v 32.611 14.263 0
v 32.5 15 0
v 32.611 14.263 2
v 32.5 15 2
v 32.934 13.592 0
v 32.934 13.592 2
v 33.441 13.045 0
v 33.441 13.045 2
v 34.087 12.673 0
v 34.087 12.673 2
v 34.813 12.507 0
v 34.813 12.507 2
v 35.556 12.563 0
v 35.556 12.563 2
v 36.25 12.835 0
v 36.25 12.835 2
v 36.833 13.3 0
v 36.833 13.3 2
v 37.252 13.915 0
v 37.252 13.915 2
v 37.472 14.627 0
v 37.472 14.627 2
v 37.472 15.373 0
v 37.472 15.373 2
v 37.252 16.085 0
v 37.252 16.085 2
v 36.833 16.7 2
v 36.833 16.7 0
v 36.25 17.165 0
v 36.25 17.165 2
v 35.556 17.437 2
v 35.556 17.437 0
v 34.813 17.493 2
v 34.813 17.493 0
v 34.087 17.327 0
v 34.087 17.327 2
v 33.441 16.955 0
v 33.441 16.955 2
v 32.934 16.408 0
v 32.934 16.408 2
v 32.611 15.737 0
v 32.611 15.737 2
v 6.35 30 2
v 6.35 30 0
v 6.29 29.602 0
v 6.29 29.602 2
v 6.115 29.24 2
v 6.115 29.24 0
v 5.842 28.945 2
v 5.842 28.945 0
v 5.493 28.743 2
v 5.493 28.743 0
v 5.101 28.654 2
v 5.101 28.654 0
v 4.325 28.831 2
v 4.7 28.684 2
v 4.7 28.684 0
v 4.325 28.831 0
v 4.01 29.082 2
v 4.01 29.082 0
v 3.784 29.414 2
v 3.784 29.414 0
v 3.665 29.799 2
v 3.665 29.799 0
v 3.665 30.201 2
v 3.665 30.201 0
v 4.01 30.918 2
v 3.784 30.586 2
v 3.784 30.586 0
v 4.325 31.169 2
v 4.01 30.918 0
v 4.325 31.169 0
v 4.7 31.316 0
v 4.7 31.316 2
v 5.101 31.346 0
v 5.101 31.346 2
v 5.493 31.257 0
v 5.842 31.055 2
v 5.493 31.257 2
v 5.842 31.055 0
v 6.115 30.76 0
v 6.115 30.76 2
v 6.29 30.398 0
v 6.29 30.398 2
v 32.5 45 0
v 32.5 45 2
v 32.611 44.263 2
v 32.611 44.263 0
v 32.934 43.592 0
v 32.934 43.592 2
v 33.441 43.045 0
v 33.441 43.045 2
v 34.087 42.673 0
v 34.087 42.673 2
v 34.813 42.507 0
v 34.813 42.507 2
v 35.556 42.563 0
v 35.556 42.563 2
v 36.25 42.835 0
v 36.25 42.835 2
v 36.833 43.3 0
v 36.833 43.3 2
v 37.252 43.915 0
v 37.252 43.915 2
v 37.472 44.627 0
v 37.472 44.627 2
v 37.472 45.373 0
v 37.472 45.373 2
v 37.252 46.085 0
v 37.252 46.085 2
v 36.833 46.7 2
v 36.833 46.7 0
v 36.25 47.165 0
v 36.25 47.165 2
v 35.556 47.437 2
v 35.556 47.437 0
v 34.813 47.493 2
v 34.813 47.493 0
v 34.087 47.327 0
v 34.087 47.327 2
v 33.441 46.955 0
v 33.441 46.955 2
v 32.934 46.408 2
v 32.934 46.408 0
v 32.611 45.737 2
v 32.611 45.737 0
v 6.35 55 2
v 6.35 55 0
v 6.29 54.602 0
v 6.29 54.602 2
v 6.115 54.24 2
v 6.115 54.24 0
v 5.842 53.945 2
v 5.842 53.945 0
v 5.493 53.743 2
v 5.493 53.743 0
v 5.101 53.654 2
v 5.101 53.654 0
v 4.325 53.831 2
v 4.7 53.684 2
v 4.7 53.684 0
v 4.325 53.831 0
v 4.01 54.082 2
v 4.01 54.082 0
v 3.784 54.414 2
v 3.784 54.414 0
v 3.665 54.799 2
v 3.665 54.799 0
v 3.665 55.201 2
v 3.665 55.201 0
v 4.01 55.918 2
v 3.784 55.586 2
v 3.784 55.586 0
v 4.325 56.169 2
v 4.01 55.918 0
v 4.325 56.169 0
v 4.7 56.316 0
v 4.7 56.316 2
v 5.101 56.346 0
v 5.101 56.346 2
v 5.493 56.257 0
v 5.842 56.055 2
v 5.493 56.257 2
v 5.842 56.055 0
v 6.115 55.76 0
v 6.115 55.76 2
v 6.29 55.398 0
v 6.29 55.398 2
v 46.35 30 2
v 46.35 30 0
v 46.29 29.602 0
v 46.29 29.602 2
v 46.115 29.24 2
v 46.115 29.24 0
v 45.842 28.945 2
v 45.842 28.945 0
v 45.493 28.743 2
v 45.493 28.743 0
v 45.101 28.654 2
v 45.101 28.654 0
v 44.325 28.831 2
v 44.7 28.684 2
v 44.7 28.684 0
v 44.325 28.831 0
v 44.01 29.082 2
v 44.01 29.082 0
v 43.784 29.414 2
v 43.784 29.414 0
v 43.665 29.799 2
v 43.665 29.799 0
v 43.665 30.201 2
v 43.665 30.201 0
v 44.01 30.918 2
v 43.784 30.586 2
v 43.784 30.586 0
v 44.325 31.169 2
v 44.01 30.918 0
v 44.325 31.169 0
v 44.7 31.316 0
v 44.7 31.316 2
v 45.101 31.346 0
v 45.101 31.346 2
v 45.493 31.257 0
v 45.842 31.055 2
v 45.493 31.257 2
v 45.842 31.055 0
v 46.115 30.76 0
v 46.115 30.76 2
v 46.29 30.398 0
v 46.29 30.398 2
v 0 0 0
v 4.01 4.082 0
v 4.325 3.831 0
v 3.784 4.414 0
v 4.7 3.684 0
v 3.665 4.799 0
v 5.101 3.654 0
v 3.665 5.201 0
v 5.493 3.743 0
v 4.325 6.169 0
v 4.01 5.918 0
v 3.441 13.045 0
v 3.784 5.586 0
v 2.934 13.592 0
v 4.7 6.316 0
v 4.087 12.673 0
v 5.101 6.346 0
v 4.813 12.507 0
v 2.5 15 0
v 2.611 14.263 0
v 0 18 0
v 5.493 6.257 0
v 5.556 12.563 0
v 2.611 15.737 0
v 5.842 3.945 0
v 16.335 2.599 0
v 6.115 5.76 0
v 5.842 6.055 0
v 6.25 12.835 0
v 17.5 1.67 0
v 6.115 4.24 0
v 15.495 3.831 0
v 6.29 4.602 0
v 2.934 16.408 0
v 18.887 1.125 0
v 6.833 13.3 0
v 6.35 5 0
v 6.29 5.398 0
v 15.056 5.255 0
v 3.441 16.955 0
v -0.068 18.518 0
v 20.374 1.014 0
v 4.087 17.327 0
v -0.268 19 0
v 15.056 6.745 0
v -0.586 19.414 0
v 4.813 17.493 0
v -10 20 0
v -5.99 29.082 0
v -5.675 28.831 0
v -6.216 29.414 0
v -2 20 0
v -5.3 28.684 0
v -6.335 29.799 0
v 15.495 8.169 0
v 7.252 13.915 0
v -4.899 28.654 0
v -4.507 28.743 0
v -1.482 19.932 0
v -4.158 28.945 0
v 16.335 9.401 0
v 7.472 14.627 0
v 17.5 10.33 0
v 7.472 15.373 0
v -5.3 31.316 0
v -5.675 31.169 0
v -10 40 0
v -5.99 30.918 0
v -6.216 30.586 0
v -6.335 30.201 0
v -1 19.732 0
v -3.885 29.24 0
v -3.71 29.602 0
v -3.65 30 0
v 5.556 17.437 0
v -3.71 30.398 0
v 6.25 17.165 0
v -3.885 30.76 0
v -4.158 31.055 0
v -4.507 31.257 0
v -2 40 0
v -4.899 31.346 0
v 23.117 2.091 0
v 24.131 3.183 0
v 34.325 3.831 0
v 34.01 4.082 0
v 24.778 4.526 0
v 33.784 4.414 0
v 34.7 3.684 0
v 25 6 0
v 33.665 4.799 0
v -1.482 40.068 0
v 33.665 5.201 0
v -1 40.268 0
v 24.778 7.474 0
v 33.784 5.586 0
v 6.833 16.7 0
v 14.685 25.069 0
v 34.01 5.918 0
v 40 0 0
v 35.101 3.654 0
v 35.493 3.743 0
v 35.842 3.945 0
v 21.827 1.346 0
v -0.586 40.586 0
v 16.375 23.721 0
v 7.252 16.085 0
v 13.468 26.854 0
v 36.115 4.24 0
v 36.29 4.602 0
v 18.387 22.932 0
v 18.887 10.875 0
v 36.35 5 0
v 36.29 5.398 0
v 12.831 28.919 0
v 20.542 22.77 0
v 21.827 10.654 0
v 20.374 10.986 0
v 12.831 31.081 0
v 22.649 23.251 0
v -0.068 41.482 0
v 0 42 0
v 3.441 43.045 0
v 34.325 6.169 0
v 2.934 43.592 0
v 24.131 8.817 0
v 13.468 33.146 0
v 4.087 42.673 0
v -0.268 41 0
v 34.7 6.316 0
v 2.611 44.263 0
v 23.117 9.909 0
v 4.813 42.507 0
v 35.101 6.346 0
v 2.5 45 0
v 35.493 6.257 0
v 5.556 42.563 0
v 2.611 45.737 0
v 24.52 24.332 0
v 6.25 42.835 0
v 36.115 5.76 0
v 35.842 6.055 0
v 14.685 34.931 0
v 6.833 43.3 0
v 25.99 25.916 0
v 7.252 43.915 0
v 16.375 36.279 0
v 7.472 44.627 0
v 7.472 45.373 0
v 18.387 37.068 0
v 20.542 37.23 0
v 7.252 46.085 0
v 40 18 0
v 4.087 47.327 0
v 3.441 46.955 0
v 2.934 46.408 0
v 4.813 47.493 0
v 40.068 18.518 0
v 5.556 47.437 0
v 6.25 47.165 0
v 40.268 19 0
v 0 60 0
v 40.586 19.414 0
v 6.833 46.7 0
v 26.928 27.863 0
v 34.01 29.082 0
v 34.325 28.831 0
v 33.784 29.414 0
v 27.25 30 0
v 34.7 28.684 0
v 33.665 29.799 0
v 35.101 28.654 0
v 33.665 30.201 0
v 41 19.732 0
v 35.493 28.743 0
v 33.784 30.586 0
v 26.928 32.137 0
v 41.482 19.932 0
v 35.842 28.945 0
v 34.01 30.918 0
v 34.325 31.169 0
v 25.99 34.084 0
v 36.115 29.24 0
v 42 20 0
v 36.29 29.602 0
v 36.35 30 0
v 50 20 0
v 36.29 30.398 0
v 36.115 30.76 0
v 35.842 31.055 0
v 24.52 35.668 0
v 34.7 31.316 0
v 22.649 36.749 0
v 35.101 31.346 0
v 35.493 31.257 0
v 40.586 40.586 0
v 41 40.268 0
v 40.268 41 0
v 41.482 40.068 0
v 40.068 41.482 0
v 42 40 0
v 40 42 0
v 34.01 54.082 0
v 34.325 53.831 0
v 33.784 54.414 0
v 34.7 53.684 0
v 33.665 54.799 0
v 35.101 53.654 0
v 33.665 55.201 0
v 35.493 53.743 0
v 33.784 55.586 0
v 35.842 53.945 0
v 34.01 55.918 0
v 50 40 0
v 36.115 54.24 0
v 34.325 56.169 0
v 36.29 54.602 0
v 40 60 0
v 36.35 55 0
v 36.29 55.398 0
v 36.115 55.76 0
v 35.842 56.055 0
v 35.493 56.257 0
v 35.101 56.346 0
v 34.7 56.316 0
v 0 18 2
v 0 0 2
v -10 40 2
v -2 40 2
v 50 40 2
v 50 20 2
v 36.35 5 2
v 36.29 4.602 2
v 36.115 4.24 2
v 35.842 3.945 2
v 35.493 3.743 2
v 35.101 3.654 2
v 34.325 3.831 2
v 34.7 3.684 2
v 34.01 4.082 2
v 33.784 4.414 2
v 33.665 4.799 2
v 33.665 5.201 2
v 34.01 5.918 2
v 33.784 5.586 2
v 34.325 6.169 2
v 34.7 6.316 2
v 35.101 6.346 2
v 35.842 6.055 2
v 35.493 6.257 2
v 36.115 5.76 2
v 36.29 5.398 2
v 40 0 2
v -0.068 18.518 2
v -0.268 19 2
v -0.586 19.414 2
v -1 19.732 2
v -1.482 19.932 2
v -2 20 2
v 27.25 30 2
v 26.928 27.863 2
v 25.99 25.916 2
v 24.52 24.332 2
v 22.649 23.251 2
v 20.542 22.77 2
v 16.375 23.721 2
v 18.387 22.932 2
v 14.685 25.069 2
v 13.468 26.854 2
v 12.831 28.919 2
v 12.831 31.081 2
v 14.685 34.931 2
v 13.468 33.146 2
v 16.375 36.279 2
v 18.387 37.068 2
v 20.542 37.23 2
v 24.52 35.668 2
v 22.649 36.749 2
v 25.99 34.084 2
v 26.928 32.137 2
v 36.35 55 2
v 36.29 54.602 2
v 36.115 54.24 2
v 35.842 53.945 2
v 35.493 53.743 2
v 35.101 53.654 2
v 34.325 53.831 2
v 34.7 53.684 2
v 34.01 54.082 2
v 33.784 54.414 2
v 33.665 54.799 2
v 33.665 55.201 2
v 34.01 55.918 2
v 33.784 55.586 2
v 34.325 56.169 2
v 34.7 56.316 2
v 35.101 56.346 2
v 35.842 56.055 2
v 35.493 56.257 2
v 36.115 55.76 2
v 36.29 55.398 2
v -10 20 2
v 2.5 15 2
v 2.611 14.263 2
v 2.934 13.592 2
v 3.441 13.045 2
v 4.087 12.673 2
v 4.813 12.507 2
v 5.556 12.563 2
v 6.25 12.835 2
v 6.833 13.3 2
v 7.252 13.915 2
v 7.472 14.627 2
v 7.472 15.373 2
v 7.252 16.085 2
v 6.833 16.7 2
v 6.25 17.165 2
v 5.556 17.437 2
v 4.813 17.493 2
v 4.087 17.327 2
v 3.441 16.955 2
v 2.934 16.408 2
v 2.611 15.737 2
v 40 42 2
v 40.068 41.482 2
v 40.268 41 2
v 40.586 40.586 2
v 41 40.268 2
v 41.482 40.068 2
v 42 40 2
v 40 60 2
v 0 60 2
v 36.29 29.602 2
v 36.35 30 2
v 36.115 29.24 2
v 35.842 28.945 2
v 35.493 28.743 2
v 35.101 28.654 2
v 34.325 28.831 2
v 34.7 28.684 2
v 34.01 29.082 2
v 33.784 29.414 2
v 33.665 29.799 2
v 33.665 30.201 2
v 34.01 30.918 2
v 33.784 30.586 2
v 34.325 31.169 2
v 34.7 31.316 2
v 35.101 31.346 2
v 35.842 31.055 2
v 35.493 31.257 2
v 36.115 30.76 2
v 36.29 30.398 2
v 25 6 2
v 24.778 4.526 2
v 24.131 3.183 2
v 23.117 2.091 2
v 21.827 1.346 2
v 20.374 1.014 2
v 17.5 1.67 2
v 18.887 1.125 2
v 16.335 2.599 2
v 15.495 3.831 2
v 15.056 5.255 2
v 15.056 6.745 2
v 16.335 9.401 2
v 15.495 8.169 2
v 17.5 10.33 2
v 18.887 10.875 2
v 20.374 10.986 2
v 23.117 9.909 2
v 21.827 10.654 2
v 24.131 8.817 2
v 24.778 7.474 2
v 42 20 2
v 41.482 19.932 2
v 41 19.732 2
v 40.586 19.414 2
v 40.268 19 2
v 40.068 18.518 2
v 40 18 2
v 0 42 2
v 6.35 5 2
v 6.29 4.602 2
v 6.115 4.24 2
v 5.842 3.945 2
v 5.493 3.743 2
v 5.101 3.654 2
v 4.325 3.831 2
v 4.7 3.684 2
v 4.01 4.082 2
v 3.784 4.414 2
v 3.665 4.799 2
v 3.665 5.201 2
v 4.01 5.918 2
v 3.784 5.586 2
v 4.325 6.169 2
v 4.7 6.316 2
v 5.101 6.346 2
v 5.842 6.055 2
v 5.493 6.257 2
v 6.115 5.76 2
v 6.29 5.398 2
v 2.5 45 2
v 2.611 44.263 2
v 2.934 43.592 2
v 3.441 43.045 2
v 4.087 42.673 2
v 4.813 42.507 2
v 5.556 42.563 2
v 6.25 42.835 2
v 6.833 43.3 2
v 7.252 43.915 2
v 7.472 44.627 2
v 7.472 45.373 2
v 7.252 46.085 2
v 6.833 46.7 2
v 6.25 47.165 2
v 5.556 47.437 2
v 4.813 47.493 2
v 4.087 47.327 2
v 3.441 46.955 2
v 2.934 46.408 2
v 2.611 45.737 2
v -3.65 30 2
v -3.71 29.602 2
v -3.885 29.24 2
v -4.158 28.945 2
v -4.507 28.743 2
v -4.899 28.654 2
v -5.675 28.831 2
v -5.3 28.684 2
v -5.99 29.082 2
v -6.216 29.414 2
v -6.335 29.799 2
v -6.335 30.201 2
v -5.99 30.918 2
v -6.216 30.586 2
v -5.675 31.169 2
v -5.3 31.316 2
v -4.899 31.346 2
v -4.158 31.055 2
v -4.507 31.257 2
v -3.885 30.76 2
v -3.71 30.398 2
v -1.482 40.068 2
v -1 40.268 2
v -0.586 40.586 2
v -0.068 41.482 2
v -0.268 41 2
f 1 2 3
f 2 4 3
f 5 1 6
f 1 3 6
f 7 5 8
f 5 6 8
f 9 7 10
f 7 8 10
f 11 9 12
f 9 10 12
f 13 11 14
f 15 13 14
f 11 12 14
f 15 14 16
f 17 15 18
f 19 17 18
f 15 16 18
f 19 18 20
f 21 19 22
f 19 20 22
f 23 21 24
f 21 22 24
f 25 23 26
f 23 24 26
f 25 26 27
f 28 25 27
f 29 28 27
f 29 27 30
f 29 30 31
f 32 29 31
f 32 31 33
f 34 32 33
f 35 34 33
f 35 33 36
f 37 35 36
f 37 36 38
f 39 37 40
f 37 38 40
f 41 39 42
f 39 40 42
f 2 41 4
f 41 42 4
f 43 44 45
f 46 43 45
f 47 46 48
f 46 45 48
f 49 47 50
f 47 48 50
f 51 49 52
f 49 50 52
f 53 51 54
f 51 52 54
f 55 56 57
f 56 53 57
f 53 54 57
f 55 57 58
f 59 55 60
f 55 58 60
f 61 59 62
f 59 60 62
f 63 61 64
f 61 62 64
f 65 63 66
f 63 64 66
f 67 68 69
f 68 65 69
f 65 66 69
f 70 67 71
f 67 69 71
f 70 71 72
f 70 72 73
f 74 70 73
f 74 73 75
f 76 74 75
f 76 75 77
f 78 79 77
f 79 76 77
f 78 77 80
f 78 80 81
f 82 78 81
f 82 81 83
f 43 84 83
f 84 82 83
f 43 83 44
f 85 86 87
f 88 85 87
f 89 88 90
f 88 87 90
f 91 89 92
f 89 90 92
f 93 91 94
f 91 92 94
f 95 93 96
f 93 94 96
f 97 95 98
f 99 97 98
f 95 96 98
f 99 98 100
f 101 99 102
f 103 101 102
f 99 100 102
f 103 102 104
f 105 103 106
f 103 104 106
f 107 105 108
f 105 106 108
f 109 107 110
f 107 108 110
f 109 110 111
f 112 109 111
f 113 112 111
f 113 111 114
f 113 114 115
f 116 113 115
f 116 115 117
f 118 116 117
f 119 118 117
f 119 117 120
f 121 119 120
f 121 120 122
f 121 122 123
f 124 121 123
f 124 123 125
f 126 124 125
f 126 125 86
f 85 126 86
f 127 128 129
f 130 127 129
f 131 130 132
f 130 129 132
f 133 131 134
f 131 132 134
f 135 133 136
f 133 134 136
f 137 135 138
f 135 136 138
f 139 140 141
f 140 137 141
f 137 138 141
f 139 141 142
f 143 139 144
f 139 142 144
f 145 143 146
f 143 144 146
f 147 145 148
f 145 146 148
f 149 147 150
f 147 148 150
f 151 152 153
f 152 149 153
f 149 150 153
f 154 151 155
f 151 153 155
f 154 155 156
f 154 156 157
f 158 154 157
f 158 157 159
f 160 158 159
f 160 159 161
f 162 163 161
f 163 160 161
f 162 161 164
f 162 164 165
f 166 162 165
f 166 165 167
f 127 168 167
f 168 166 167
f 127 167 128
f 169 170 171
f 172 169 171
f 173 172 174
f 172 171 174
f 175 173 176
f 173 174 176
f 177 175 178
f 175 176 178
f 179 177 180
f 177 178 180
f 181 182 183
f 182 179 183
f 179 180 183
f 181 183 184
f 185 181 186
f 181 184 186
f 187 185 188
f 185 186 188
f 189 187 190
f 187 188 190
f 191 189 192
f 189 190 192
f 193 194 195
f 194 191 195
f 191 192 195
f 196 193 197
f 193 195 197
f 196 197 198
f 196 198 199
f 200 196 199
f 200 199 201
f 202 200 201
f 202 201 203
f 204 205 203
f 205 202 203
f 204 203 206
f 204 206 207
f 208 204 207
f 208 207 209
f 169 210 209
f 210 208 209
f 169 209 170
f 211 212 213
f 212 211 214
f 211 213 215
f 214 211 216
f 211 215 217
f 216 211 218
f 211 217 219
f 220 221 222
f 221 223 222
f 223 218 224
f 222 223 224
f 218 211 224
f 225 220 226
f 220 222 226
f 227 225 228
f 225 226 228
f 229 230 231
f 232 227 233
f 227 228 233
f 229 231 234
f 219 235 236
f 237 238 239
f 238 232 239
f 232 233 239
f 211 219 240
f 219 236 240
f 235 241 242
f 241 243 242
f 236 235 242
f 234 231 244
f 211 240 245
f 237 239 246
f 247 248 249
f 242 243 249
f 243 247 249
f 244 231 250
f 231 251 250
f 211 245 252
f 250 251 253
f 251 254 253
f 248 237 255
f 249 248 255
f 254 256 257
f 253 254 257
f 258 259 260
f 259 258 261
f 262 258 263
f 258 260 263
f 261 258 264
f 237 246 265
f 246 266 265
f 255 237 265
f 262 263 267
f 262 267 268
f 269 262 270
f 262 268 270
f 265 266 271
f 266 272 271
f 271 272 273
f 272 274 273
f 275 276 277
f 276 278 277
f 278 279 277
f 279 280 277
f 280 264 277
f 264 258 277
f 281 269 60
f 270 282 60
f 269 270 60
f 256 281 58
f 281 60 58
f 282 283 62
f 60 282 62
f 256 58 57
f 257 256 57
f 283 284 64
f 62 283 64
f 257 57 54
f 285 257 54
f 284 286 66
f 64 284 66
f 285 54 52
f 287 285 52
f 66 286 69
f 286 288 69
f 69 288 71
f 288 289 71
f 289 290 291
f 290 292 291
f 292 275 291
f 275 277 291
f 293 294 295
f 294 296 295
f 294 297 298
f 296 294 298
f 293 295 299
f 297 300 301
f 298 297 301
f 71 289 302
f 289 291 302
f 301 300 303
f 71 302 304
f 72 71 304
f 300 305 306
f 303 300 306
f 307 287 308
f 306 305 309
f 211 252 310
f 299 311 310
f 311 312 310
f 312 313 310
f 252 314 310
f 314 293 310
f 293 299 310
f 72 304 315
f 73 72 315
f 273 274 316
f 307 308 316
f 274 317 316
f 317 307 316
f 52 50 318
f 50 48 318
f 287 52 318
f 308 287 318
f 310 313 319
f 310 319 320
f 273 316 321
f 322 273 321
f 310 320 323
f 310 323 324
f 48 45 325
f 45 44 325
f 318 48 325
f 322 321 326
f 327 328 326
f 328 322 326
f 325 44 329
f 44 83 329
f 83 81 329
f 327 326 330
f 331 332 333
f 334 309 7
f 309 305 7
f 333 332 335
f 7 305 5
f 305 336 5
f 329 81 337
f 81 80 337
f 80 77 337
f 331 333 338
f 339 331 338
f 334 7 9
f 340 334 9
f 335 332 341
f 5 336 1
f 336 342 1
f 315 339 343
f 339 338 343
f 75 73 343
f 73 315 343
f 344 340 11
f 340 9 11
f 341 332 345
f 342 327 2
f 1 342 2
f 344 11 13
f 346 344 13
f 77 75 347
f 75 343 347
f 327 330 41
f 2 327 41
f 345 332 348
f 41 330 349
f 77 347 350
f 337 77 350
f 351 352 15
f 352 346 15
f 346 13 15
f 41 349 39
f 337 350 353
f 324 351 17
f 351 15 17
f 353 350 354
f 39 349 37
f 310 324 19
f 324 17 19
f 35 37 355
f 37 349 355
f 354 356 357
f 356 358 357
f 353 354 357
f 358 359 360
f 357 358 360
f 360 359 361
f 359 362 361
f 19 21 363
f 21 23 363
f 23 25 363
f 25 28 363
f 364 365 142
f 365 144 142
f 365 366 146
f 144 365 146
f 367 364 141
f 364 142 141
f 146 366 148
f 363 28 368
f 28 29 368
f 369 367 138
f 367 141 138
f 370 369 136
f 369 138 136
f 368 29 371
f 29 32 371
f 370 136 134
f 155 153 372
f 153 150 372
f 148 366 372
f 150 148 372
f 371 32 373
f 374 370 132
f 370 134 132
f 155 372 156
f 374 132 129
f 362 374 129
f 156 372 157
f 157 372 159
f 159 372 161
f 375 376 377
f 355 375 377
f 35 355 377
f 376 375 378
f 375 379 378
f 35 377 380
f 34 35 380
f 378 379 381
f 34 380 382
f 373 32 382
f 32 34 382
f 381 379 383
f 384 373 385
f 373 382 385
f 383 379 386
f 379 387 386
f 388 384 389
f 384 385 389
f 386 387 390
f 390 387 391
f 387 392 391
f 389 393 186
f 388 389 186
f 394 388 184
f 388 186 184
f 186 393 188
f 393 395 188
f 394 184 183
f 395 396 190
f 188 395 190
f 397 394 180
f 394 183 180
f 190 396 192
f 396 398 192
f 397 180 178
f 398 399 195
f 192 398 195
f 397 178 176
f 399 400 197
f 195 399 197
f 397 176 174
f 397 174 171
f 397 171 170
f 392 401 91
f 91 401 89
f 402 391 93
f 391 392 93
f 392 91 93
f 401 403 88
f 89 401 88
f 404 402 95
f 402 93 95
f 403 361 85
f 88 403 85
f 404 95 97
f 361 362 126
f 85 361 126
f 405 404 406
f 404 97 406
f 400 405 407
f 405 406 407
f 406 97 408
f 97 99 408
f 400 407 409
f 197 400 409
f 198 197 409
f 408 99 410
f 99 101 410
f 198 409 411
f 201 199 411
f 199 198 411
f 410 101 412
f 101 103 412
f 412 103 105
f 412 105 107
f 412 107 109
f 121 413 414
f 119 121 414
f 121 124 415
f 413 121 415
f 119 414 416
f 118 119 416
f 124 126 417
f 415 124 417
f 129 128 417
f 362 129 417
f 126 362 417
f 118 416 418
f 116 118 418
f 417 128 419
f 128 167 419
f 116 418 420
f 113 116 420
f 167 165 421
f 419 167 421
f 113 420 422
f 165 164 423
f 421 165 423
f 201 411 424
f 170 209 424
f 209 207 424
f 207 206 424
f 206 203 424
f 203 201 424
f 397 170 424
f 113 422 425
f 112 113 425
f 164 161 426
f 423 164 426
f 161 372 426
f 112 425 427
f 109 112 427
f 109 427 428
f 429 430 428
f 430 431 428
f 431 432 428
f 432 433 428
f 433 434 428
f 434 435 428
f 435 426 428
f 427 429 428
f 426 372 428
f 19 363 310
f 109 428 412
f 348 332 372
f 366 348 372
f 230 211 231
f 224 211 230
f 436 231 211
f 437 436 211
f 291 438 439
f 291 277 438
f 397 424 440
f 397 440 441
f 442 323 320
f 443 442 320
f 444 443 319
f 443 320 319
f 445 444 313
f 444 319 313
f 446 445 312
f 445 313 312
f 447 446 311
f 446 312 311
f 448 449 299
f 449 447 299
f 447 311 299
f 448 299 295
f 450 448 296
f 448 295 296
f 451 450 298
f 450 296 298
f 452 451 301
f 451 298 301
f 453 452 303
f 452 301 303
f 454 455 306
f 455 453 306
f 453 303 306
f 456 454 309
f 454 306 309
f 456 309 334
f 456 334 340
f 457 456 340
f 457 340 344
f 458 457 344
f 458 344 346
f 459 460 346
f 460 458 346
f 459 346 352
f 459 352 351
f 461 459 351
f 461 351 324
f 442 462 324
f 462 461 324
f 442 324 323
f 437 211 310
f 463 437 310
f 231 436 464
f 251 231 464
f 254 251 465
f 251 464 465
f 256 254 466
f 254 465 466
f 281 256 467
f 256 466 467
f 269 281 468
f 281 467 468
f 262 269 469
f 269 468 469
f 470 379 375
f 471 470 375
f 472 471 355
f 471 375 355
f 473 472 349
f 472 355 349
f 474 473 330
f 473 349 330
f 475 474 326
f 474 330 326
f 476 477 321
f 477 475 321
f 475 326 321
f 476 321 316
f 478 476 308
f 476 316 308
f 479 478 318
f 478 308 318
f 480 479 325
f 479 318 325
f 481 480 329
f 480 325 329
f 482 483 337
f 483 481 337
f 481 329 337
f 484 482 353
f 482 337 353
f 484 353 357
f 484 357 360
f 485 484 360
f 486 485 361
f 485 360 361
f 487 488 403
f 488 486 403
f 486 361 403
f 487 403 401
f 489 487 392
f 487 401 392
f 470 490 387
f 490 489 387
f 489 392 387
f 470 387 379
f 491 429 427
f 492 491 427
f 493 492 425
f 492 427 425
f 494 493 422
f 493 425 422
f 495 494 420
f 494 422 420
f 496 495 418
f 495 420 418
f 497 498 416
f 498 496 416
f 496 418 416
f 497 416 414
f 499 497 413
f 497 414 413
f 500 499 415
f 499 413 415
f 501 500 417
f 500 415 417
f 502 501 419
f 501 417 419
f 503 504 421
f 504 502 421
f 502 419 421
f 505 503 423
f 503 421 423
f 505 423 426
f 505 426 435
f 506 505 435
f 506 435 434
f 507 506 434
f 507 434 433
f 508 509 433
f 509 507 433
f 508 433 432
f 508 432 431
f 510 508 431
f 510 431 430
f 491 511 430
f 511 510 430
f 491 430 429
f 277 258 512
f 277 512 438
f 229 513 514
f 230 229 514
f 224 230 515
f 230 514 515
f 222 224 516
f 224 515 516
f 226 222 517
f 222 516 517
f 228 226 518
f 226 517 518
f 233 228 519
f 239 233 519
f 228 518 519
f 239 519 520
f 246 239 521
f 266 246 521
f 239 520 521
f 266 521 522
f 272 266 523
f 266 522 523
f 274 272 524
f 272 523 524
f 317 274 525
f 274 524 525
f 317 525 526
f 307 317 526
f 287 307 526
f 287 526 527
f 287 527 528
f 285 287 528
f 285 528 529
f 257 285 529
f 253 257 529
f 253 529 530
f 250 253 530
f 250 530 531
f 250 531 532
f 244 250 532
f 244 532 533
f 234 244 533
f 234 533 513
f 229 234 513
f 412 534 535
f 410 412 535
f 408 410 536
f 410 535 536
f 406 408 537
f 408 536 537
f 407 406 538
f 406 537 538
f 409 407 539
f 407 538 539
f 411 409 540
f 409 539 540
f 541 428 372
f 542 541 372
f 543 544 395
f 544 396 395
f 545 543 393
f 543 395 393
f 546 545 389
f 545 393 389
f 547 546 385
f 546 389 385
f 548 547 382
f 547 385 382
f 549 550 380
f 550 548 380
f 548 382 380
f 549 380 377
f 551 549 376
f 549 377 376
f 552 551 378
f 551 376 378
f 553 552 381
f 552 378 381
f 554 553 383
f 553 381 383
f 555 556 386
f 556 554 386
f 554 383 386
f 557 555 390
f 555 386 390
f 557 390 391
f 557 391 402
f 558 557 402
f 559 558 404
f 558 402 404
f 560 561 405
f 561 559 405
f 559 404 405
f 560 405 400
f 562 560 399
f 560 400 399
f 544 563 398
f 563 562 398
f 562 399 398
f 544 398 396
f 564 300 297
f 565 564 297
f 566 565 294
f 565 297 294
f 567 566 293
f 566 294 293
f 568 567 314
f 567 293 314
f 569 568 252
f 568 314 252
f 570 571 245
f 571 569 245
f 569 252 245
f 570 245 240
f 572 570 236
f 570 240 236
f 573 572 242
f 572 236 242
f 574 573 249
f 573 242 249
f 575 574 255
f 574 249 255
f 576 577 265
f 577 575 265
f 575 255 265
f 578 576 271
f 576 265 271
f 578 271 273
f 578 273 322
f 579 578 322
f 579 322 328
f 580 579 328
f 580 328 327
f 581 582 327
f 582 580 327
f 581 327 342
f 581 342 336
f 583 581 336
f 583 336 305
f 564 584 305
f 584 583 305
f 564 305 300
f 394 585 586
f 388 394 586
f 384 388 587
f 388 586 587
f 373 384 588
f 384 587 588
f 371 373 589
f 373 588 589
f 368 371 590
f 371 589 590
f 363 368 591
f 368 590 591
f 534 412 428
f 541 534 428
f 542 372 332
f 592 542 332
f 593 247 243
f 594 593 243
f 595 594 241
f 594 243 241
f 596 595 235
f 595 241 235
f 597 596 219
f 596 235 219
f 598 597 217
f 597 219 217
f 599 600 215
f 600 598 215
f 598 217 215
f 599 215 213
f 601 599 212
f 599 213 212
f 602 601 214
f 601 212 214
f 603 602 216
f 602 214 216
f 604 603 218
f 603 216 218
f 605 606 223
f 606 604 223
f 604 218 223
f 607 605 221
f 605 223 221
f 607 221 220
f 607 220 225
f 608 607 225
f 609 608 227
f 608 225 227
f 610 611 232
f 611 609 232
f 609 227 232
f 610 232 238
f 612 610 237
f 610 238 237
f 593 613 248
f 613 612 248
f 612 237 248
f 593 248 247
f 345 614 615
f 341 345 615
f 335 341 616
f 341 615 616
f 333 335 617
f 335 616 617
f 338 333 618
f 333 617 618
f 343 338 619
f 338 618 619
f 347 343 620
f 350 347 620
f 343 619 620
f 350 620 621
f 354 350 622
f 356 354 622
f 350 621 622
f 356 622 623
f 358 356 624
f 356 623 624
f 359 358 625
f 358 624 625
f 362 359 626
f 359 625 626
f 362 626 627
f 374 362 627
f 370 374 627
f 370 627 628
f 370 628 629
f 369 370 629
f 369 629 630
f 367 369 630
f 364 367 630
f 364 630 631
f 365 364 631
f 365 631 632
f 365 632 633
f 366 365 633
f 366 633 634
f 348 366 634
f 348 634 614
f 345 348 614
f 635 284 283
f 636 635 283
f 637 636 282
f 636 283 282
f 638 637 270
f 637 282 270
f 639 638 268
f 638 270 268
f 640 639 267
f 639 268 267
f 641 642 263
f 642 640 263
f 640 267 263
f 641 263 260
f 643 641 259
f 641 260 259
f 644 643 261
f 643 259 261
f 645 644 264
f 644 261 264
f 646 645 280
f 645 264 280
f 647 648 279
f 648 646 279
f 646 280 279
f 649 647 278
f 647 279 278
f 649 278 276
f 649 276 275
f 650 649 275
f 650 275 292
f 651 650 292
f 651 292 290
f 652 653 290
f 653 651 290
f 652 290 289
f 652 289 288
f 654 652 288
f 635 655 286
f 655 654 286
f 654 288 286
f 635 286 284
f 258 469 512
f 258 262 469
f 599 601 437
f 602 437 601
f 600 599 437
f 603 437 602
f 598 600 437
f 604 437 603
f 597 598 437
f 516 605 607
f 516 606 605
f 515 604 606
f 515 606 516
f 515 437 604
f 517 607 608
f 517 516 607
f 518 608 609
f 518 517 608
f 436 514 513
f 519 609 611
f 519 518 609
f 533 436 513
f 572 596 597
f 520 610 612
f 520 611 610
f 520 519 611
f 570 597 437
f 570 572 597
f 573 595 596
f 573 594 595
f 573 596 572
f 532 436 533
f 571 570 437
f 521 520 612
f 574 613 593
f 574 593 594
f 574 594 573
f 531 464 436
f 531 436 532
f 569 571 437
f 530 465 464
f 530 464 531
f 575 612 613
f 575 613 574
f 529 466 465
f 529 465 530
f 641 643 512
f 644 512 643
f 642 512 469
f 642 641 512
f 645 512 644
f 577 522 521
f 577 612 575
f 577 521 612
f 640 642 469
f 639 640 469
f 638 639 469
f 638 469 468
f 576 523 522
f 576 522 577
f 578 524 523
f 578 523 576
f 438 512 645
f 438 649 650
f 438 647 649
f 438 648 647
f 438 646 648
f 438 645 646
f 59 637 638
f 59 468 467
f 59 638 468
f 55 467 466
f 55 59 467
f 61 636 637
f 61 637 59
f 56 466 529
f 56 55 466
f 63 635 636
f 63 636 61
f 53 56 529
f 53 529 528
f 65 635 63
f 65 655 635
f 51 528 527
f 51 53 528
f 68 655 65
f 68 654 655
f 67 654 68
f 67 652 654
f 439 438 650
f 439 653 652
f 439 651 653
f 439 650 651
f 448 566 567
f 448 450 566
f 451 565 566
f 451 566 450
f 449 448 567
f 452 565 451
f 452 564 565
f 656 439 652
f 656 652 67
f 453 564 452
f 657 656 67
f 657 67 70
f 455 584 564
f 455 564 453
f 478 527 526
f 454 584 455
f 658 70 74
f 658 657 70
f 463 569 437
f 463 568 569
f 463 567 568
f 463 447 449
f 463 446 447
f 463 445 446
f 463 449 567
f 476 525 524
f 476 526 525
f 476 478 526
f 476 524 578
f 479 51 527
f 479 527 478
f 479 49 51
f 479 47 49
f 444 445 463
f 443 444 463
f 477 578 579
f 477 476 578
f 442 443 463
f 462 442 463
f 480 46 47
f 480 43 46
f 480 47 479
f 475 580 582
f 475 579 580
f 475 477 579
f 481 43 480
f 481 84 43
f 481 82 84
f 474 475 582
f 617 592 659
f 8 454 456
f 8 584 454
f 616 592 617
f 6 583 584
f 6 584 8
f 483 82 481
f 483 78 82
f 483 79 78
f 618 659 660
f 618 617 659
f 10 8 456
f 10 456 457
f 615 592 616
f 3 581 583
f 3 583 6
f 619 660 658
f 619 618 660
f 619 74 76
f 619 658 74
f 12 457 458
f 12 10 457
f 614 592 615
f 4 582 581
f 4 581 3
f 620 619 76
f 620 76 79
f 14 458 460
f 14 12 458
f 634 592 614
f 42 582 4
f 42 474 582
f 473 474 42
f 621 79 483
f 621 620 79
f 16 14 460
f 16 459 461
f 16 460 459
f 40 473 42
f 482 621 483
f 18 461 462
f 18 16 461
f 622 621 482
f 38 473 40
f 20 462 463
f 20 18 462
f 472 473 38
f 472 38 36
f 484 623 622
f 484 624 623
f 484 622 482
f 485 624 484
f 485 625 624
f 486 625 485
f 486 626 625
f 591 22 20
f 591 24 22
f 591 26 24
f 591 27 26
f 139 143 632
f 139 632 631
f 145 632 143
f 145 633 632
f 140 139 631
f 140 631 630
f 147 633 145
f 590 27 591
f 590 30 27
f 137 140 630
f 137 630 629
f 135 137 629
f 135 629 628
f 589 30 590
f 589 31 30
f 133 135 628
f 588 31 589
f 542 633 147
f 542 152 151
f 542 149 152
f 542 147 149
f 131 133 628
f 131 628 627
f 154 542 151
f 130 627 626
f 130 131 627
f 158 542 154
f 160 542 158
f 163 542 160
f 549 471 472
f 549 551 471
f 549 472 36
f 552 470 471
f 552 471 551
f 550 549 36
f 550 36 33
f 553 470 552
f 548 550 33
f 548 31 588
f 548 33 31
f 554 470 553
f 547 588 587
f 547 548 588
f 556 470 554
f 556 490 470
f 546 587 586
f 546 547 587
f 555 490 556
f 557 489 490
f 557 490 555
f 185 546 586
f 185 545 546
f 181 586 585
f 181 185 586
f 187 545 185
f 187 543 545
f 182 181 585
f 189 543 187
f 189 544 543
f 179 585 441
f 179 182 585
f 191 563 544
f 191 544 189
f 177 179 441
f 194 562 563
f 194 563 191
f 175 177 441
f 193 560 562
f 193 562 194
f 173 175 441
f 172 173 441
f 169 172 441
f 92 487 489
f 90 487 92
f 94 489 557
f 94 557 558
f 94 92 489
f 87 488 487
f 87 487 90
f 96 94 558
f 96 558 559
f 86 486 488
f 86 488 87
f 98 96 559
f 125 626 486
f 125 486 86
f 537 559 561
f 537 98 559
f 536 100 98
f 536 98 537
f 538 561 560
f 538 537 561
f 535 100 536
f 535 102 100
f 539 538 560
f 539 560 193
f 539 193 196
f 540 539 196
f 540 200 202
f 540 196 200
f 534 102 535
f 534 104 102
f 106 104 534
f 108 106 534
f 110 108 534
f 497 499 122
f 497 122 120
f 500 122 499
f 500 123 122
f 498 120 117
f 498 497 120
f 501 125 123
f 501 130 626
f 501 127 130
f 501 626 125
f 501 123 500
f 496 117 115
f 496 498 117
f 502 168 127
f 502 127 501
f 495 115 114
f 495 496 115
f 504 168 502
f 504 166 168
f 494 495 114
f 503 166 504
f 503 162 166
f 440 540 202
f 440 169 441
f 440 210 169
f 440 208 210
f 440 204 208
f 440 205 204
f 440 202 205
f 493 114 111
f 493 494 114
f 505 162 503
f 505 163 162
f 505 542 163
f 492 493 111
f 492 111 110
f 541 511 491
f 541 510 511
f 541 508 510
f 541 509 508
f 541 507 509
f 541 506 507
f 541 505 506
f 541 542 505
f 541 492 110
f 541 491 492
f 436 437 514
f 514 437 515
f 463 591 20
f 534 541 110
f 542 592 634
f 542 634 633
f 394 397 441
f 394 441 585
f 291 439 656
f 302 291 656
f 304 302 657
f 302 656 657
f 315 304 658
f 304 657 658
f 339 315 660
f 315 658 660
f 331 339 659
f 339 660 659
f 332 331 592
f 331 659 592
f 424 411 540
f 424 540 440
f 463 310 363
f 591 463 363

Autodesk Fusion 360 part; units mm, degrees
sketch "Sketch1" plane through (0, 0, 0) normal (0, 0, 1) x (1, 0, 0)
  line L0 (0, 0) -> (40, 0)
  line L1 (40, 0) -> (40, 60)
  line L2 (40, 60) -> (0, 60)
  line L3 (0, 60) -> (0, 0)
  circle A0 centre (5, 5) radius 1.35
  circle A1 centre (20, 30) radius 7.25
  circle A2 centre (20, 30) radius 5.75
  circle A3 centre (35, 5) radius 1.35
  circle A4 centre (5, 30) radius 1.35
  circle A5 centre (35, 30) radius 1.35
  circle A6 centre (5, 55) radius 1.35
  circle A7 centre (35, 55) radius 1.35
  circle A8 centre (20, 6) radius 5
  line L4 (-10, 40) -> (50, 40)
  line L5 (50, 40) -> (50, 20)
  line L6 (50, 20) -> (-10, 20)
  line L7 (-10, 20) -> (-10, 40)
  circle A9 centre (-5, 30) radius 1.35
  circle A10 centre (45, 30) radius 1.35
  dimension "d1" = 2.7
  dimension "d2" = 60
  dimension "d3" = 40
  dimension "d4" = 5
  dimension "d5" = 5
  dimension "d6" = 14.5
  dimension "d7" = 20
  dimension "d8" = 30
  dimension "d9" = 11.5
  dimension "d12" = 30
  dimension "d13" = 50
  dimension "d20" = 6
  dimension "d21" = 20
  dimension "d22" = 10
  dimension "d23" = 60
  dimension "d24" = 20
  dimension "d25" = 30
  dimension "d26" = 10
  dimension "d29" = 50
  dimension "d30" = 0
  dimension "d31" = 2.7
  dimension "d32" = 5
  dimension "d33" = 10
extrude "Extrude1" add sketch "Sketch1" along normal blind 2 contours L0 L1 L3 L6 | L3 L4 L6 L7 | L1 L3 L4 L6 | L1 L4 L5 L6 | L1 L2 L3 L4
fillet "Fillet2" radius 2 4 edges at (40, 20, 1) (40, 40, 1) (0, 40, 1) (0, 20, 1)
sketch "Sketch2" plane through (0, 0, 2) normal (0, 0, 1) x (-1, 0, 0)
  circle A0 centre (-5, -5) radius 1.35
  circle A1 centre (-5, -30) radius 1.35
  circle A2 centre (-35, -5) radius 1.35
  circle A3 centre (-35, -30) radius 1.35
  circle A4 centre (-35, -55) radius 1.35
  circle A5 centre (-20, -6) radius 5
  circle A6 centre (-20, -30) radius 7.25
  circle A7 centre (-45, -30) radius 1.35
  circle A8 centre (5, -30) radius 1.35
  circle A9 centre (-5, -55) radius 1.35
  line L0 (0, -18) -> (0, 0)
  line L1 (0, 0) -> (-40, 0)
  line L2 (-40, 0) -> (-40, -18)
  arc A10 (-42, -20) -> (-40, -18) centre (-42, -18) ccw
  line L3 (-42, -20) -> (-50, -20)
  line L4 (-50, -20) -> (-50, -40)
  line L5 (-50, -40) -> (-42, -40)
  arc A11 (-40, -42) -> (-42, -40) centre (-42, -42) ccw
  line L6 (-40, -42) -> (-40, -60)
  line L7 (-40, -60) -> (0, -60)
  line L8 (0, -60) -> (0, -42)
  arc A12 (2, -40) -> (0, -42) centre (2, -42) ccw
  line L9 (2, -40) -> (10, -40)
  line L10 (10, -40) -> (10, -20)
  line L11 (10, -20) -> (2, -20)
  arc A13 (0, -18) -> (2, -20) centre (2, -18) ccw
  circle A14 centre (-5, -45) radius 2.5
  circle A15 centre (-35, -45) radius 2.5
  circle A16 centre (-5, -15) radius 2.5
  circle A17 centre (-35, -15) radius 2.5
  dimension "d38" = -30
  dimension "d39" = 30
  dimension "d40" = 5
  dimension "d41" = 15
  dimension "d42" = 5
extrude "Extrude3" cut sketch "Sketch2" against normal blind 2 contours A14 | A15 | A16 | A17
extrude "Extrude2" [suppressed]
fillet "Fillet1" [suppressed]
